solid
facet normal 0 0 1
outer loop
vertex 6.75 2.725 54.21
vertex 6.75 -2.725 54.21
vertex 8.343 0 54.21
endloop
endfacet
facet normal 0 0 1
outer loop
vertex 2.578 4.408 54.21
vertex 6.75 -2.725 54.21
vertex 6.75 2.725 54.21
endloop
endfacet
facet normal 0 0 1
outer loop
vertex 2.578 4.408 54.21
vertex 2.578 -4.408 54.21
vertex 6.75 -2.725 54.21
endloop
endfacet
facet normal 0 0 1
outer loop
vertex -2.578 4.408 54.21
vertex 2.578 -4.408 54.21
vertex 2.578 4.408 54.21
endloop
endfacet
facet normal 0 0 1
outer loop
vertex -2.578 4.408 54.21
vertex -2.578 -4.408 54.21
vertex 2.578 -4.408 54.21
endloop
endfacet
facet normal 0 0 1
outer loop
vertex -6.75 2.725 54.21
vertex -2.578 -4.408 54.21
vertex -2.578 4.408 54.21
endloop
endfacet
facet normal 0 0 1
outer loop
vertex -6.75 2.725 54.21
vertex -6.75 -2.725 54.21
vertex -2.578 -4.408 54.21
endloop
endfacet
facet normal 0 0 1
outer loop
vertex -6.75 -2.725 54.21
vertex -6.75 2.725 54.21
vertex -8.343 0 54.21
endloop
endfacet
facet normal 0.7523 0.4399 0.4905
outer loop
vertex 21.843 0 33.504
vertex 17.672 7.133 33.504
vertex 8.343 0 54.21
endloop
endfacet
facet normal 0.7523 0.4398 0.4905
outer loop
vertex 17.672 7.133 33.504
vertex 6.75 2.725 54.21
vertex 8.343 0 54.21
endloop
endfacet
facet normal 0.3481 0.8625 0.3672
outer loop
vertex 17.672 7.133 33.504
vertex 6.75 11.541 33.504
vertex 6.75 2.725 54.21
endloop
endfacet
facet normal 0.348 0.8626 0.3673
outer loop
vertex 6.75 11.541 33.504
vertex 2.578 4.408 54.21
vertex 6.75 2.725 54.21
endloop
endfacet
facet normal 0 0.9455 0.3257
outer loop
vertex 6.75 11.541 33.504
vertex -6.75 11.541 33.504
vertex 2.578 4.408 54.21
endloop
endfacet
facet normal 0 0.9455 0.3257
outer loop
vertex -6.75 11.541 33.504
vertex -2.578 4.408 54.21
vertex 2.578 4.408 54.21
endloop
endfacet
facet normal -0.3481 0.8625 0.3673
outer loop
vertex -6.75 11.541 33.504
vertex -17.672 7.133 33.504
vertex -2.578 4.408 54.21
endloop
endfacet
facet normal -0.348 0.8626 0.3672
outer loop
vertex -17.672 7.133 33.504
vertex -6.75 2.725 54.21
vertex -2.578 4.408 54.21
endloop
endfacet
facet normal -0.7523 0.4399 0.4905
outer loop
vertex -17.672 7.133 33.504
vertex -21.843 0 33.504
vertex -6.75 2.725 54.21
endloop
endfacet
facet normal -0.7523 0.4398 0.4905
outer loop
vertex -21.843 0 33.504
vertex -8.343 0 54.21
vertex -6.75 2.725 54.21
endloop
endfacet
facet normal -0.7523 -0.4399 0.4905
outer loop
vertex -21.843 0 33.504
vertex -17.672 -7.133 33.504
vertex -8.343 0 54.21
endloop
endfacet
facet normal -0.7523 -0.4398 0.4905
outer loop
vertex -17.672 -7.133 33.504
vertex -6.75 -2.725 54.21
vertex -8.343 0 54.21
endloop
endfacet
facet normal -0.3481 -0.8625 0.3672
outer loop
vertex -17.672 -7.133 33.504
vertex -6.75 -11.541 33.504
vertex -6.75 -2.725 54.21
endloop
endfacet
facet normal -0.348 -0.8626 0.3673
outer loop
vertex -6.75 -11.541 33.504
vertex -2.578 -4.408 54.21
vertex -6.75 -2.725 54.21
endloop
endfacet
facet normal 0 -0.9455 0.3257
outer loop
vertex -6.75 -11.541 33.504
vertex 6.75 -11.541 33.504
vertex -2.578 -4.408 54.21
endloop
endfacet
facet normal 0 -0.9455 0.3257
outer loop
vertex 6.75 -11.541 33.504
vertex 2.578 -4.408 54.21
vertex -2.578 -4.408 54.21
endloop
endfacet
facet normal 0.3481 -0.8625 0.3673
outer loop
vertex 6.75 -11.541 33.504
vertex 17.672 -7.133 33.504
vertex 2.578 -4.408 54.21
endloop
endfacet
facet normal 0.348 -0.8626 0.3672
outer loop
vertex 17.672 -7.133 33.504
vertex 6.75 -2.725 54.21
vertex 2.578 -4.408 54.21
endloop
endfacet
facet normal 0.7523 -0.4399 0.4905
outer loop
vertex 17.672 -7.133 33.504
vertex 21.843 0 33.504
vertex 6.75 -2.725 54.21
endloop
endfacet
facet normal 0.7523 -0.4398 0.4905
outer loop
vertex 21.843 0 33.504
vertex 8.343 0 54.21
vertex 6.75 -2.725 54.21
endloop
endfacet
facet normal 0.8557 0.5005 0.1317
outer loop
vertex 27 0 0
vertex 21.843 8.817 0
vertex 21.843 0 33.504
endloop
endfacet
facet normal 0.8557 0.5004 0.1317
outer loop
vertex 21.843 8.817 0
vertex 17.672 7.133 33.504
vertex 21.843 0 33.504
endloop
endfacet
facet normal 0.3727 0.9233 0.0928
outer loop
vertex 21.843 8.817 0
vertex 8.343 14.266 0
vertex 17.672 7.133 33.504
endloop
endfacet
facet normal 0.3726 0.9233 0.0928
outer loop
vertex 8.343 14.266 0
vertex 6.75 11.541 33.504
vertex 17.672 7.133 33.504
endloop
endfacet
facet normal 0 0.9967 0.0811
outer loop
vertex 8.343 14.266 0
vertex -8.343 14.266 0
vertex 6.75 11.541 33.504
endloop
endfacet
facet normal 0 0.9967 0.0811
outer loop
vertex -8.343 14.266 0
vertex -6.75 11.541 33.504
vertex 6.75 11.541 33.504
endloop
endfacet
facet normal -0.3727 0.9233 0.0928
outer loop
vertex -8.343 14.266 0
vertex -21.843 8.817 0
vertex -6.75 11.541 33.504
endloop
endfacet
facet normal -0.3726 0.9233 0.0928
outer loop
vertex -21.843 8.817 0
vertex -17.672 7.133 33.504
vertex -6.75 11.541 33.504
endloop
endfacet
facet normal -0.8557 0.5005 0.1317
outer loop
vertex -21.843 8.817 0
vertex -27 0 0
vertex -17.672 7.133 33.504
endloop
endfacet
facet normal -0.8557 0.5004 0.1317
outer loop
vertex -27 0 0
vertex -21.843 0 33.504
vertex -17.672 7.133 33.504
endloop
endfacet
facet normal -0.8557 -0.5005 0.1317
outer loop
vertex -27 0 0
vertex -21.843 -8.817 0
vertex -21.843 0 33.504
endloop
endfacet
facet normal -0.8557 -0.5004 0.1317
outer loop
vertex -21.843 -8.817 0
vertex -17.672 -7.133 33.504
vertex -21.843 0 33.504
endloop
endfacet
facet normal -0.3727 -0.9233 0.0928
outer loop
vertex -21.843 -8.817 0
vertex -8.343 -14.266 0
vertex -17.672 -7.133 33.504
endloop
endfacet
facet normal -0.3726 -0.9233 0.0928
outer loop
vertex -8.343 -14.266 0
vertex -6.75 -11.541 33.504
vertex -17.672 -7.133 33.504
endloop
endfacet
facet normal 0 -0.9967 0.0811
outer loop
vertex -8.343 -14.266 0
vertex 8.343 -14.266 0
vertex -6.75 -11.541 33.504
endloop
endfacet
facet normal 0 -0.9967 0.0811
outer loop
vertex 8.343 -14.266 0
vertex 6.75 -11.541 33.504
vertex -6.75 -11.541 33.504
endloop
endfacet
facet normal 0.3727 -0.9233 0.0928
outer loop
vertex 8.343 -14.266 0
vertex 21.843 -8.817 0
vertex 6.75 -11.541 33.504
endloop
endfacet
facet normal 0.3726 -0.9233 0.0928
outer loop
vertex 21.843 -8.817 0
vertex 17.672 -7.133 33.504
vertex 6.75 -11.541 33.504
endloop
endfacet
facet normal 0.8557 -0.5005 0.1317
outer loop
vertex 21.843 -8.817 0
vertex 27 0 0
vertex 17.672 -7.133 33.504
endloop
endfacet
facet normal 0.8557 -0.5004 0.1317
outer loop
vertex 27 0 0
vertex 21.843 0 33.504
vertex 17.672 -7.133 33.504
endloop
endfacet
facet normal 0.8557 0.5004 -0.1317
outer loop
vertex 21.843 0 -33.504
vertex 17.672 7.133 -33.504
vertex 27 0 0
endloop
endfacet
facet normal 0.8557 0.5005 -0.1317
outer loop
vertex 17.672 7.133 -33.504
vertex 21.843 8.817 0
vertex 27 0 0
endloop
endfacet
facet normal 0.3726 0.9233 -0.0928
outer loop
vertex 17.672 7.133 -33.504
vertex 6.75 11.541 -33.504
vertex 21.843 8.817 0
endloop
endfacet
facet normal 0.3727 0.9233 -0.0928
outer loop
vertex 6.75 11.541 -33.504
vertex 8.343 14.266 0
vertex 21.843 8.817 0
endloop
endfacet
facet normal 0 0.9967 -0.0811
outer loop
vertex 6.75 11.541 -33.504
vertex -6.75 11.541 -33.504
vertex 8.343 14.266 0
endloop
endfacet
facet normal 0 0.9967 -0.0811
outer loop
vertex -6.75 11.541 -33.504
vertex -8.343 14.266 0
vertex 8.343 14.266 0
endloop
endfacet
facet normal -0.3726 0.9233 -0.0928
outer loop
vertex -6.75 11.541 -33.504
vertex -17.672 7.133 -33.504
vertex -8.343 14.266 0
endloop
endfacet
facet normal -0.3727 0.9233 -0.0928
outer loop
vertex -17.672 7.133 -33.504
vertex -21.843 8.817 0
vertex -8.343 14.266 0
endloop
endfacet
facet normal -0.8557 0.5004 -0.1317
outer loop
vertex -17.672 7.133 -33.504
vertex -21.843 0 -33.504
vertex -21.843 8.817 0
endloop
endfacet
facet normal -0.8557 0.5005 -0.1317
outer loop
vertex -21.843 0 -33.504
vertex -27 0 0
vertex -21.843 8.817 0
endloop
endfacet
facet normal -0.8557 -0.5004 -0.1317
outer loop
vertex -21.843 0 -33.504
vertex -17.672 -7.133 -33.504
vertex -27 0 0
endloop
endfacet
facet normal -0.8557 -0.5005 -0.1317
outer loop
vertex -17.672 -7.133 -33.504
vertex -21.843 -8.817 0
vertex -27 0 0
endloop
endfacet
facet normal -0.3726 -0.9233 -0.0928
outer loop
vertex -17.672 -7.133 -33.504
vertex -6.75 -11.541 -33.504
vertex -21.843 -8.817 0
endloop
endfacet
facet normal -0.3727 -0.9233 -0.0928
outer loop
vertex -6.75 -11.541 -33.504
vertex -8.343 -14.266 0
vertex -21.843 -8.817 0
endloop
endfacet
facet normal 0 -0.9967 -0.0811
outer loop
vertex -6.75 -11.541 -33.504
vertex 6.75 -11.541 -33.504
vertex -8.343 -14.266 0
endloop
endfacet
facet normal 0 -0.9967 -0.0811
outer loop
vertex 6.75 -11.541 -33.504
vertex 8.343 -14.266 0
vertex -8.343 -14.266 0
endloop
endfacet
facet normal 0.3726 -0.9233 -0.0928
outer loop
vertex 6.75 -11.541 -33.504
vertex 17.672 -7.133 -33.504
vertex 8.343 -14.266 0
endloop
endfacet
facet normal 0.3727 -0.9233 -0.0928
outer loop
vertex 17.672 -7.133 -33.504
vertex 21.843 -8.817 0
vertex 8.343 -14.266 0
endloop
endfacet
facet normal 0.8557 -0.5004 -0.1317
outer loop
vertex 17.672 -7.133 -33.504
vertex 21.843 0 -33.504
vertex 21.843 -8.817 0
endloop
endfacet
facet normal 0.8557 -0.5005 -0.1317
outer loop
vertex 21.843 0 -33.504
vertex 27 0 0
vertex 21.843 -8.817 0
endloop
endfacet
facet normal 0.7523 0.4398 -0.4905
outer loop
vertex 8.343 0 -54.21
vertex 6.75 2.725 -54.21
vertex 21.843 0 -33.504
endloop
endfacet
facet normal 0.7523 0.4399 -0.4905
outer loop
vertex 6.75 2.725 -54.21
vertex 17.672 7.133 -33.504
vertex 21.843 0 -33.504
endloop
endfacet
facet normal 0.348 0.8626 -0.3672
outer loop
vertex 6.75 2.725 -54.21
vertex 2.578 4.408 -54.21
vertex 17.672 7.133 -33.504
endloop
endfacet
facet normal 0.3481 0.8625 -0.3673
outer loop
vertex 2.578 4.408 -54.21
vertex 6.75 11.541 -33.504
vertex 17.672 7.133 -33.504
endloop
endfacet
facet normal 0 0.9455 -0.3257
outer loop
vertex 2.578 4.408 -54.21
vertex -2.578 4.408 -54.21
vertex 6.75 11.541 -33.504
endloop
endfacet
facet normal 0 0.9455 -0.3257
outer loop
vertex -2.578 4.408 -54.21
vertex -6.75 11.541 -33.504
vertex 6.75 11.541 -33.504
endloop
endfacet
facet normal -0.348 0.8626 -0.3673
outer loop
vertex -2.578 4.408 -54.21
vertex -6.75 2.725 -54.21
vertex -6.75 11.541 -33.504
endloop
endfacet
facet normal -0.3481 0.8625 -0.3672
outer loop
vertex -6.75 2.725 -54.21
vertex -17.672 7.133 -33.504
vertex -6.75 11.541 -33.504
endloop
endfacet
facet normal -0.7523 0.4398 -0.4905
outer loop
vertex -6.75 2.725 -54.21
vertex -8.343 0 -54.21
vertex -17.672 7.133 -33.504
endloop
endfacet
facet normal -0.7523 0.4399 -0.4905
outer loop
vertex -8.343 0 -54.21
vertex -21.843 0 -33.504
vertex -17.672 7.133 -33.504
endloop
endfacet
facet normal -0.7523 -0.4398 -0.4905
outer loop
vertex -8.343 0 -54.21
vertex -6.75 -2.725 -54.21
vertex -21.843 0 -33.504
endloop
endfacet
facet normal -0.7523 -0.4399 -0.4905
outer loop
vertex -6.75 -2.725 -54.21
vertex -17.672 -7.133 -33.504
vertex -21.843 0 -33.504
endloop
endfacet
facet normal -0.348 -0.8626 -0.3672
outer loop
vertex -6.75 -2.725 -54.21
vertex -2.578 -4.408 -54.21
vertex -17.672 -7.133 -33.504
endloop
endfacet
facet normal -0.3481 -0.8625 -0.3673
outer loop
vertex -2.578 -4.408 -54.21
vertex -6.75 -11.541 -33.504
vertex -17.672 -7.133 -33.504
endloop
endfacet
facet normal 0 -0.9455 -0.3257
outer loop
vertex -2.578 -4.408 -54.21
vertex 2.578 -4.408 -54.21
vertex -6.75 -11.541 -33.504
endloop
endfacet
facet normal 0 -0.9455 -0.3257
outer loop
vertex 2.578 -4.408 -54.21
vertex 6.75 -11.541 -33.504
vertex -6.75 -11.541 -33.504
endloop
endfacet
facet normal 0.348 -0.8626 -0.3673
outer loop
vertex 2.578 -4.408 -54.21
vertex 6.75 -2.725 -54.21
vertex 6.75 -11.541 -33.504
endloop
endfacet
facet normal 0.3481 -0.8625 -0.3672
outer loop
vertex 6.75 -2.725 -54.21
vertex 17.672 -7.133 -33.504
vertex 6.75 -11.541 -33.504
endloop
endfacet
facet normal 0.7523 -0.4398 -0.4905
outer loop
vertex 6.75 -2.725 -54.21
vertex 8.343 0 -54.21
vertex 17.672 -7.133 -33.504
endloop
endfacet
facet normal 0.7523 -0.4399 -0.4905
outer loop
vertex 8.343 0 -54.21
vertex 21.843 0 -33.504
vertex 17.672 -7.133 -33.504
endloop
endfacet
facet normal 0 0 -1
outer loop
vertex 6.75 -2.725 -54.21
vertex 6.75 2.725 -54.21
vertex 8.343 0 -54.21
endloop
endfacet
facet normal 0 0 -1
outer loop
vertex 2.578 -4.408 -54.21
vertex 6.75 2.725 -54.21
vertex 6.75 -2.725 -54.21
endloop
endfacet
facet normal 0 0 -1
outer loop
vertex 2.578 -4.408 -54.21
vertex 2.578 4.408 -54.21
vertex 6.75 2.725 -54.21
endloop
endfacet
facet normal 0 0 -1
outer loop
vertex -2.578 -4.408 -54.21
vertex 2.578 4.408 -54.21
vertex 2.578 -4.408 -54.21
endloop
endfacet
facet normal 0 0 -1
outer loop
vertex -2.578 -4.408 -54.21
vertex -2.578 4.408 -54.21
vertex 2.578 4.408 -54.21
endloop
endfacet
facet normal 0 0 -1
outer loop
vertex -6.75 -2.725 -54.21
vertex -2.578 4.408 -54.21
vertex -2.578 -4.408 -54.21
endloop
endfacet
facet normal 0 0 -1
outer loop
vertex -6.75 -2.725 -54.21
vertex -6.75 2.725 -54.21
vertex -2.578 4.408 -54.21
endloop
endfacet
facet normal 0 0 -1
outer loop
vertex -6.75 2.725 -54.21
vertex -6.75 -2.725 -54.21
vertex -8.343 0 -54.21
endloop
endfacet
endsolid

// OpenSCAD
// Generated by SolidPython 1.0.1 on 2020-07-29 00:46:48


scale(v = [9, 5, 19]) {
	sphere(r = 3);
}
/***********************************************
*********      SolidPython code:      **********
************************************************
 
# import packages: SolidPython
from solid import *
from solid.utils import *
from itertools import chain, combinations, permutations


class Resize:

    def __init__(self, scad_file):
        self.scad_file = scad_file
        #self.scad_file = import_scad(scad_file)
        # cone/cylinder param:
        self.r1 = 0
        self.r2 = 0
        self.h = 0
        # rectangular prism param:
        self.w = 0
        self.l = 0
        # ellipse param:
        self.r = 0

    # import OpenScad code (file name corresponds to shape)


    # classify shape + parameters
    def assign(self, param1, param2, param3):
        if self.scad_file == 'cone.scad':
            self.r1 = param1
            self.r2 = param2
            self.h = param3
        elif self.scad_file == 'cylinder.scad':
            self.r1 = param1
            self.r2 = param2
            self.h = param3
        elif self.scad_file == 'rectangularPrism.scad':
            self.h = param1
            self.l = param2
            self.w = param3
        else:
            self.r = param1
            self.h = param2

    # resize parameters
    def iterate(self):
        x = range(3, 20, 2)
        i = 1
        if self.scad_file == 'cone.scad':
            tempList = list(permutations(x, 2))
            for temp in tempList:
                param1 = temp[0]
                param2 = temp[1]
                filepath = 'produced_scad_files/' + 'cone' + str(param1) + '_' + str(param2) + '_' + '.scad'
                scad_render_to_file(cylinder(h=param1, r1=param2, r2=0), filepath)

        elif self.scad_file == 'cylinder.scad':
            tempList = list(permutations(x, 3))
            for temp in tempList:
                param1 = temp[0]
                param2 = temp[1]
                filepath = 'produced_scad_files/' + 'cylinder' + str(param1) + '_' + str(param2) + '_' + '.scad'
                scad_render_to_file(cylinder(h=param1, r1=param2, r2=param2), filepath)

        elif self.scad_file == 'rectangularPrism.scad':
            tempList = list(permutations(x, 3))
            for temp in tempList:
                param1 = temp[0]
                param2 = temp[1]
                param3 = temp[2]
                filepath = 'produced_scad_files/' + 'rectangularPrism' + str(param1) + '_' + str(param2) + '_' + str(
                    param3) + '.scad'
                scad_render_to_file(cube(size=(param1, param2, param3)), filepath)

        elif self.scad_file == 'ellipse.scad':
            tempList = list(permutations(x, 4))
            for temp in tempList:
                param1 = temp[0]
                param2 = temp[1]
                param3 = temp[2]
                param4 = temp[3]
                filepath = 'produced_scad_files/' + 'ellipse' + str(param1) + '_' + str(param2) + '_' + str(param3) + '_' + str(param4) + '.scad'
                scad_render_to_file(scale([param1, param2, param3])(sphere(r=param4)), filepath)

    def render_to_scadfile(self):
        scad_render_to_file(scad, 'example.scad') 
 
************************************************/
